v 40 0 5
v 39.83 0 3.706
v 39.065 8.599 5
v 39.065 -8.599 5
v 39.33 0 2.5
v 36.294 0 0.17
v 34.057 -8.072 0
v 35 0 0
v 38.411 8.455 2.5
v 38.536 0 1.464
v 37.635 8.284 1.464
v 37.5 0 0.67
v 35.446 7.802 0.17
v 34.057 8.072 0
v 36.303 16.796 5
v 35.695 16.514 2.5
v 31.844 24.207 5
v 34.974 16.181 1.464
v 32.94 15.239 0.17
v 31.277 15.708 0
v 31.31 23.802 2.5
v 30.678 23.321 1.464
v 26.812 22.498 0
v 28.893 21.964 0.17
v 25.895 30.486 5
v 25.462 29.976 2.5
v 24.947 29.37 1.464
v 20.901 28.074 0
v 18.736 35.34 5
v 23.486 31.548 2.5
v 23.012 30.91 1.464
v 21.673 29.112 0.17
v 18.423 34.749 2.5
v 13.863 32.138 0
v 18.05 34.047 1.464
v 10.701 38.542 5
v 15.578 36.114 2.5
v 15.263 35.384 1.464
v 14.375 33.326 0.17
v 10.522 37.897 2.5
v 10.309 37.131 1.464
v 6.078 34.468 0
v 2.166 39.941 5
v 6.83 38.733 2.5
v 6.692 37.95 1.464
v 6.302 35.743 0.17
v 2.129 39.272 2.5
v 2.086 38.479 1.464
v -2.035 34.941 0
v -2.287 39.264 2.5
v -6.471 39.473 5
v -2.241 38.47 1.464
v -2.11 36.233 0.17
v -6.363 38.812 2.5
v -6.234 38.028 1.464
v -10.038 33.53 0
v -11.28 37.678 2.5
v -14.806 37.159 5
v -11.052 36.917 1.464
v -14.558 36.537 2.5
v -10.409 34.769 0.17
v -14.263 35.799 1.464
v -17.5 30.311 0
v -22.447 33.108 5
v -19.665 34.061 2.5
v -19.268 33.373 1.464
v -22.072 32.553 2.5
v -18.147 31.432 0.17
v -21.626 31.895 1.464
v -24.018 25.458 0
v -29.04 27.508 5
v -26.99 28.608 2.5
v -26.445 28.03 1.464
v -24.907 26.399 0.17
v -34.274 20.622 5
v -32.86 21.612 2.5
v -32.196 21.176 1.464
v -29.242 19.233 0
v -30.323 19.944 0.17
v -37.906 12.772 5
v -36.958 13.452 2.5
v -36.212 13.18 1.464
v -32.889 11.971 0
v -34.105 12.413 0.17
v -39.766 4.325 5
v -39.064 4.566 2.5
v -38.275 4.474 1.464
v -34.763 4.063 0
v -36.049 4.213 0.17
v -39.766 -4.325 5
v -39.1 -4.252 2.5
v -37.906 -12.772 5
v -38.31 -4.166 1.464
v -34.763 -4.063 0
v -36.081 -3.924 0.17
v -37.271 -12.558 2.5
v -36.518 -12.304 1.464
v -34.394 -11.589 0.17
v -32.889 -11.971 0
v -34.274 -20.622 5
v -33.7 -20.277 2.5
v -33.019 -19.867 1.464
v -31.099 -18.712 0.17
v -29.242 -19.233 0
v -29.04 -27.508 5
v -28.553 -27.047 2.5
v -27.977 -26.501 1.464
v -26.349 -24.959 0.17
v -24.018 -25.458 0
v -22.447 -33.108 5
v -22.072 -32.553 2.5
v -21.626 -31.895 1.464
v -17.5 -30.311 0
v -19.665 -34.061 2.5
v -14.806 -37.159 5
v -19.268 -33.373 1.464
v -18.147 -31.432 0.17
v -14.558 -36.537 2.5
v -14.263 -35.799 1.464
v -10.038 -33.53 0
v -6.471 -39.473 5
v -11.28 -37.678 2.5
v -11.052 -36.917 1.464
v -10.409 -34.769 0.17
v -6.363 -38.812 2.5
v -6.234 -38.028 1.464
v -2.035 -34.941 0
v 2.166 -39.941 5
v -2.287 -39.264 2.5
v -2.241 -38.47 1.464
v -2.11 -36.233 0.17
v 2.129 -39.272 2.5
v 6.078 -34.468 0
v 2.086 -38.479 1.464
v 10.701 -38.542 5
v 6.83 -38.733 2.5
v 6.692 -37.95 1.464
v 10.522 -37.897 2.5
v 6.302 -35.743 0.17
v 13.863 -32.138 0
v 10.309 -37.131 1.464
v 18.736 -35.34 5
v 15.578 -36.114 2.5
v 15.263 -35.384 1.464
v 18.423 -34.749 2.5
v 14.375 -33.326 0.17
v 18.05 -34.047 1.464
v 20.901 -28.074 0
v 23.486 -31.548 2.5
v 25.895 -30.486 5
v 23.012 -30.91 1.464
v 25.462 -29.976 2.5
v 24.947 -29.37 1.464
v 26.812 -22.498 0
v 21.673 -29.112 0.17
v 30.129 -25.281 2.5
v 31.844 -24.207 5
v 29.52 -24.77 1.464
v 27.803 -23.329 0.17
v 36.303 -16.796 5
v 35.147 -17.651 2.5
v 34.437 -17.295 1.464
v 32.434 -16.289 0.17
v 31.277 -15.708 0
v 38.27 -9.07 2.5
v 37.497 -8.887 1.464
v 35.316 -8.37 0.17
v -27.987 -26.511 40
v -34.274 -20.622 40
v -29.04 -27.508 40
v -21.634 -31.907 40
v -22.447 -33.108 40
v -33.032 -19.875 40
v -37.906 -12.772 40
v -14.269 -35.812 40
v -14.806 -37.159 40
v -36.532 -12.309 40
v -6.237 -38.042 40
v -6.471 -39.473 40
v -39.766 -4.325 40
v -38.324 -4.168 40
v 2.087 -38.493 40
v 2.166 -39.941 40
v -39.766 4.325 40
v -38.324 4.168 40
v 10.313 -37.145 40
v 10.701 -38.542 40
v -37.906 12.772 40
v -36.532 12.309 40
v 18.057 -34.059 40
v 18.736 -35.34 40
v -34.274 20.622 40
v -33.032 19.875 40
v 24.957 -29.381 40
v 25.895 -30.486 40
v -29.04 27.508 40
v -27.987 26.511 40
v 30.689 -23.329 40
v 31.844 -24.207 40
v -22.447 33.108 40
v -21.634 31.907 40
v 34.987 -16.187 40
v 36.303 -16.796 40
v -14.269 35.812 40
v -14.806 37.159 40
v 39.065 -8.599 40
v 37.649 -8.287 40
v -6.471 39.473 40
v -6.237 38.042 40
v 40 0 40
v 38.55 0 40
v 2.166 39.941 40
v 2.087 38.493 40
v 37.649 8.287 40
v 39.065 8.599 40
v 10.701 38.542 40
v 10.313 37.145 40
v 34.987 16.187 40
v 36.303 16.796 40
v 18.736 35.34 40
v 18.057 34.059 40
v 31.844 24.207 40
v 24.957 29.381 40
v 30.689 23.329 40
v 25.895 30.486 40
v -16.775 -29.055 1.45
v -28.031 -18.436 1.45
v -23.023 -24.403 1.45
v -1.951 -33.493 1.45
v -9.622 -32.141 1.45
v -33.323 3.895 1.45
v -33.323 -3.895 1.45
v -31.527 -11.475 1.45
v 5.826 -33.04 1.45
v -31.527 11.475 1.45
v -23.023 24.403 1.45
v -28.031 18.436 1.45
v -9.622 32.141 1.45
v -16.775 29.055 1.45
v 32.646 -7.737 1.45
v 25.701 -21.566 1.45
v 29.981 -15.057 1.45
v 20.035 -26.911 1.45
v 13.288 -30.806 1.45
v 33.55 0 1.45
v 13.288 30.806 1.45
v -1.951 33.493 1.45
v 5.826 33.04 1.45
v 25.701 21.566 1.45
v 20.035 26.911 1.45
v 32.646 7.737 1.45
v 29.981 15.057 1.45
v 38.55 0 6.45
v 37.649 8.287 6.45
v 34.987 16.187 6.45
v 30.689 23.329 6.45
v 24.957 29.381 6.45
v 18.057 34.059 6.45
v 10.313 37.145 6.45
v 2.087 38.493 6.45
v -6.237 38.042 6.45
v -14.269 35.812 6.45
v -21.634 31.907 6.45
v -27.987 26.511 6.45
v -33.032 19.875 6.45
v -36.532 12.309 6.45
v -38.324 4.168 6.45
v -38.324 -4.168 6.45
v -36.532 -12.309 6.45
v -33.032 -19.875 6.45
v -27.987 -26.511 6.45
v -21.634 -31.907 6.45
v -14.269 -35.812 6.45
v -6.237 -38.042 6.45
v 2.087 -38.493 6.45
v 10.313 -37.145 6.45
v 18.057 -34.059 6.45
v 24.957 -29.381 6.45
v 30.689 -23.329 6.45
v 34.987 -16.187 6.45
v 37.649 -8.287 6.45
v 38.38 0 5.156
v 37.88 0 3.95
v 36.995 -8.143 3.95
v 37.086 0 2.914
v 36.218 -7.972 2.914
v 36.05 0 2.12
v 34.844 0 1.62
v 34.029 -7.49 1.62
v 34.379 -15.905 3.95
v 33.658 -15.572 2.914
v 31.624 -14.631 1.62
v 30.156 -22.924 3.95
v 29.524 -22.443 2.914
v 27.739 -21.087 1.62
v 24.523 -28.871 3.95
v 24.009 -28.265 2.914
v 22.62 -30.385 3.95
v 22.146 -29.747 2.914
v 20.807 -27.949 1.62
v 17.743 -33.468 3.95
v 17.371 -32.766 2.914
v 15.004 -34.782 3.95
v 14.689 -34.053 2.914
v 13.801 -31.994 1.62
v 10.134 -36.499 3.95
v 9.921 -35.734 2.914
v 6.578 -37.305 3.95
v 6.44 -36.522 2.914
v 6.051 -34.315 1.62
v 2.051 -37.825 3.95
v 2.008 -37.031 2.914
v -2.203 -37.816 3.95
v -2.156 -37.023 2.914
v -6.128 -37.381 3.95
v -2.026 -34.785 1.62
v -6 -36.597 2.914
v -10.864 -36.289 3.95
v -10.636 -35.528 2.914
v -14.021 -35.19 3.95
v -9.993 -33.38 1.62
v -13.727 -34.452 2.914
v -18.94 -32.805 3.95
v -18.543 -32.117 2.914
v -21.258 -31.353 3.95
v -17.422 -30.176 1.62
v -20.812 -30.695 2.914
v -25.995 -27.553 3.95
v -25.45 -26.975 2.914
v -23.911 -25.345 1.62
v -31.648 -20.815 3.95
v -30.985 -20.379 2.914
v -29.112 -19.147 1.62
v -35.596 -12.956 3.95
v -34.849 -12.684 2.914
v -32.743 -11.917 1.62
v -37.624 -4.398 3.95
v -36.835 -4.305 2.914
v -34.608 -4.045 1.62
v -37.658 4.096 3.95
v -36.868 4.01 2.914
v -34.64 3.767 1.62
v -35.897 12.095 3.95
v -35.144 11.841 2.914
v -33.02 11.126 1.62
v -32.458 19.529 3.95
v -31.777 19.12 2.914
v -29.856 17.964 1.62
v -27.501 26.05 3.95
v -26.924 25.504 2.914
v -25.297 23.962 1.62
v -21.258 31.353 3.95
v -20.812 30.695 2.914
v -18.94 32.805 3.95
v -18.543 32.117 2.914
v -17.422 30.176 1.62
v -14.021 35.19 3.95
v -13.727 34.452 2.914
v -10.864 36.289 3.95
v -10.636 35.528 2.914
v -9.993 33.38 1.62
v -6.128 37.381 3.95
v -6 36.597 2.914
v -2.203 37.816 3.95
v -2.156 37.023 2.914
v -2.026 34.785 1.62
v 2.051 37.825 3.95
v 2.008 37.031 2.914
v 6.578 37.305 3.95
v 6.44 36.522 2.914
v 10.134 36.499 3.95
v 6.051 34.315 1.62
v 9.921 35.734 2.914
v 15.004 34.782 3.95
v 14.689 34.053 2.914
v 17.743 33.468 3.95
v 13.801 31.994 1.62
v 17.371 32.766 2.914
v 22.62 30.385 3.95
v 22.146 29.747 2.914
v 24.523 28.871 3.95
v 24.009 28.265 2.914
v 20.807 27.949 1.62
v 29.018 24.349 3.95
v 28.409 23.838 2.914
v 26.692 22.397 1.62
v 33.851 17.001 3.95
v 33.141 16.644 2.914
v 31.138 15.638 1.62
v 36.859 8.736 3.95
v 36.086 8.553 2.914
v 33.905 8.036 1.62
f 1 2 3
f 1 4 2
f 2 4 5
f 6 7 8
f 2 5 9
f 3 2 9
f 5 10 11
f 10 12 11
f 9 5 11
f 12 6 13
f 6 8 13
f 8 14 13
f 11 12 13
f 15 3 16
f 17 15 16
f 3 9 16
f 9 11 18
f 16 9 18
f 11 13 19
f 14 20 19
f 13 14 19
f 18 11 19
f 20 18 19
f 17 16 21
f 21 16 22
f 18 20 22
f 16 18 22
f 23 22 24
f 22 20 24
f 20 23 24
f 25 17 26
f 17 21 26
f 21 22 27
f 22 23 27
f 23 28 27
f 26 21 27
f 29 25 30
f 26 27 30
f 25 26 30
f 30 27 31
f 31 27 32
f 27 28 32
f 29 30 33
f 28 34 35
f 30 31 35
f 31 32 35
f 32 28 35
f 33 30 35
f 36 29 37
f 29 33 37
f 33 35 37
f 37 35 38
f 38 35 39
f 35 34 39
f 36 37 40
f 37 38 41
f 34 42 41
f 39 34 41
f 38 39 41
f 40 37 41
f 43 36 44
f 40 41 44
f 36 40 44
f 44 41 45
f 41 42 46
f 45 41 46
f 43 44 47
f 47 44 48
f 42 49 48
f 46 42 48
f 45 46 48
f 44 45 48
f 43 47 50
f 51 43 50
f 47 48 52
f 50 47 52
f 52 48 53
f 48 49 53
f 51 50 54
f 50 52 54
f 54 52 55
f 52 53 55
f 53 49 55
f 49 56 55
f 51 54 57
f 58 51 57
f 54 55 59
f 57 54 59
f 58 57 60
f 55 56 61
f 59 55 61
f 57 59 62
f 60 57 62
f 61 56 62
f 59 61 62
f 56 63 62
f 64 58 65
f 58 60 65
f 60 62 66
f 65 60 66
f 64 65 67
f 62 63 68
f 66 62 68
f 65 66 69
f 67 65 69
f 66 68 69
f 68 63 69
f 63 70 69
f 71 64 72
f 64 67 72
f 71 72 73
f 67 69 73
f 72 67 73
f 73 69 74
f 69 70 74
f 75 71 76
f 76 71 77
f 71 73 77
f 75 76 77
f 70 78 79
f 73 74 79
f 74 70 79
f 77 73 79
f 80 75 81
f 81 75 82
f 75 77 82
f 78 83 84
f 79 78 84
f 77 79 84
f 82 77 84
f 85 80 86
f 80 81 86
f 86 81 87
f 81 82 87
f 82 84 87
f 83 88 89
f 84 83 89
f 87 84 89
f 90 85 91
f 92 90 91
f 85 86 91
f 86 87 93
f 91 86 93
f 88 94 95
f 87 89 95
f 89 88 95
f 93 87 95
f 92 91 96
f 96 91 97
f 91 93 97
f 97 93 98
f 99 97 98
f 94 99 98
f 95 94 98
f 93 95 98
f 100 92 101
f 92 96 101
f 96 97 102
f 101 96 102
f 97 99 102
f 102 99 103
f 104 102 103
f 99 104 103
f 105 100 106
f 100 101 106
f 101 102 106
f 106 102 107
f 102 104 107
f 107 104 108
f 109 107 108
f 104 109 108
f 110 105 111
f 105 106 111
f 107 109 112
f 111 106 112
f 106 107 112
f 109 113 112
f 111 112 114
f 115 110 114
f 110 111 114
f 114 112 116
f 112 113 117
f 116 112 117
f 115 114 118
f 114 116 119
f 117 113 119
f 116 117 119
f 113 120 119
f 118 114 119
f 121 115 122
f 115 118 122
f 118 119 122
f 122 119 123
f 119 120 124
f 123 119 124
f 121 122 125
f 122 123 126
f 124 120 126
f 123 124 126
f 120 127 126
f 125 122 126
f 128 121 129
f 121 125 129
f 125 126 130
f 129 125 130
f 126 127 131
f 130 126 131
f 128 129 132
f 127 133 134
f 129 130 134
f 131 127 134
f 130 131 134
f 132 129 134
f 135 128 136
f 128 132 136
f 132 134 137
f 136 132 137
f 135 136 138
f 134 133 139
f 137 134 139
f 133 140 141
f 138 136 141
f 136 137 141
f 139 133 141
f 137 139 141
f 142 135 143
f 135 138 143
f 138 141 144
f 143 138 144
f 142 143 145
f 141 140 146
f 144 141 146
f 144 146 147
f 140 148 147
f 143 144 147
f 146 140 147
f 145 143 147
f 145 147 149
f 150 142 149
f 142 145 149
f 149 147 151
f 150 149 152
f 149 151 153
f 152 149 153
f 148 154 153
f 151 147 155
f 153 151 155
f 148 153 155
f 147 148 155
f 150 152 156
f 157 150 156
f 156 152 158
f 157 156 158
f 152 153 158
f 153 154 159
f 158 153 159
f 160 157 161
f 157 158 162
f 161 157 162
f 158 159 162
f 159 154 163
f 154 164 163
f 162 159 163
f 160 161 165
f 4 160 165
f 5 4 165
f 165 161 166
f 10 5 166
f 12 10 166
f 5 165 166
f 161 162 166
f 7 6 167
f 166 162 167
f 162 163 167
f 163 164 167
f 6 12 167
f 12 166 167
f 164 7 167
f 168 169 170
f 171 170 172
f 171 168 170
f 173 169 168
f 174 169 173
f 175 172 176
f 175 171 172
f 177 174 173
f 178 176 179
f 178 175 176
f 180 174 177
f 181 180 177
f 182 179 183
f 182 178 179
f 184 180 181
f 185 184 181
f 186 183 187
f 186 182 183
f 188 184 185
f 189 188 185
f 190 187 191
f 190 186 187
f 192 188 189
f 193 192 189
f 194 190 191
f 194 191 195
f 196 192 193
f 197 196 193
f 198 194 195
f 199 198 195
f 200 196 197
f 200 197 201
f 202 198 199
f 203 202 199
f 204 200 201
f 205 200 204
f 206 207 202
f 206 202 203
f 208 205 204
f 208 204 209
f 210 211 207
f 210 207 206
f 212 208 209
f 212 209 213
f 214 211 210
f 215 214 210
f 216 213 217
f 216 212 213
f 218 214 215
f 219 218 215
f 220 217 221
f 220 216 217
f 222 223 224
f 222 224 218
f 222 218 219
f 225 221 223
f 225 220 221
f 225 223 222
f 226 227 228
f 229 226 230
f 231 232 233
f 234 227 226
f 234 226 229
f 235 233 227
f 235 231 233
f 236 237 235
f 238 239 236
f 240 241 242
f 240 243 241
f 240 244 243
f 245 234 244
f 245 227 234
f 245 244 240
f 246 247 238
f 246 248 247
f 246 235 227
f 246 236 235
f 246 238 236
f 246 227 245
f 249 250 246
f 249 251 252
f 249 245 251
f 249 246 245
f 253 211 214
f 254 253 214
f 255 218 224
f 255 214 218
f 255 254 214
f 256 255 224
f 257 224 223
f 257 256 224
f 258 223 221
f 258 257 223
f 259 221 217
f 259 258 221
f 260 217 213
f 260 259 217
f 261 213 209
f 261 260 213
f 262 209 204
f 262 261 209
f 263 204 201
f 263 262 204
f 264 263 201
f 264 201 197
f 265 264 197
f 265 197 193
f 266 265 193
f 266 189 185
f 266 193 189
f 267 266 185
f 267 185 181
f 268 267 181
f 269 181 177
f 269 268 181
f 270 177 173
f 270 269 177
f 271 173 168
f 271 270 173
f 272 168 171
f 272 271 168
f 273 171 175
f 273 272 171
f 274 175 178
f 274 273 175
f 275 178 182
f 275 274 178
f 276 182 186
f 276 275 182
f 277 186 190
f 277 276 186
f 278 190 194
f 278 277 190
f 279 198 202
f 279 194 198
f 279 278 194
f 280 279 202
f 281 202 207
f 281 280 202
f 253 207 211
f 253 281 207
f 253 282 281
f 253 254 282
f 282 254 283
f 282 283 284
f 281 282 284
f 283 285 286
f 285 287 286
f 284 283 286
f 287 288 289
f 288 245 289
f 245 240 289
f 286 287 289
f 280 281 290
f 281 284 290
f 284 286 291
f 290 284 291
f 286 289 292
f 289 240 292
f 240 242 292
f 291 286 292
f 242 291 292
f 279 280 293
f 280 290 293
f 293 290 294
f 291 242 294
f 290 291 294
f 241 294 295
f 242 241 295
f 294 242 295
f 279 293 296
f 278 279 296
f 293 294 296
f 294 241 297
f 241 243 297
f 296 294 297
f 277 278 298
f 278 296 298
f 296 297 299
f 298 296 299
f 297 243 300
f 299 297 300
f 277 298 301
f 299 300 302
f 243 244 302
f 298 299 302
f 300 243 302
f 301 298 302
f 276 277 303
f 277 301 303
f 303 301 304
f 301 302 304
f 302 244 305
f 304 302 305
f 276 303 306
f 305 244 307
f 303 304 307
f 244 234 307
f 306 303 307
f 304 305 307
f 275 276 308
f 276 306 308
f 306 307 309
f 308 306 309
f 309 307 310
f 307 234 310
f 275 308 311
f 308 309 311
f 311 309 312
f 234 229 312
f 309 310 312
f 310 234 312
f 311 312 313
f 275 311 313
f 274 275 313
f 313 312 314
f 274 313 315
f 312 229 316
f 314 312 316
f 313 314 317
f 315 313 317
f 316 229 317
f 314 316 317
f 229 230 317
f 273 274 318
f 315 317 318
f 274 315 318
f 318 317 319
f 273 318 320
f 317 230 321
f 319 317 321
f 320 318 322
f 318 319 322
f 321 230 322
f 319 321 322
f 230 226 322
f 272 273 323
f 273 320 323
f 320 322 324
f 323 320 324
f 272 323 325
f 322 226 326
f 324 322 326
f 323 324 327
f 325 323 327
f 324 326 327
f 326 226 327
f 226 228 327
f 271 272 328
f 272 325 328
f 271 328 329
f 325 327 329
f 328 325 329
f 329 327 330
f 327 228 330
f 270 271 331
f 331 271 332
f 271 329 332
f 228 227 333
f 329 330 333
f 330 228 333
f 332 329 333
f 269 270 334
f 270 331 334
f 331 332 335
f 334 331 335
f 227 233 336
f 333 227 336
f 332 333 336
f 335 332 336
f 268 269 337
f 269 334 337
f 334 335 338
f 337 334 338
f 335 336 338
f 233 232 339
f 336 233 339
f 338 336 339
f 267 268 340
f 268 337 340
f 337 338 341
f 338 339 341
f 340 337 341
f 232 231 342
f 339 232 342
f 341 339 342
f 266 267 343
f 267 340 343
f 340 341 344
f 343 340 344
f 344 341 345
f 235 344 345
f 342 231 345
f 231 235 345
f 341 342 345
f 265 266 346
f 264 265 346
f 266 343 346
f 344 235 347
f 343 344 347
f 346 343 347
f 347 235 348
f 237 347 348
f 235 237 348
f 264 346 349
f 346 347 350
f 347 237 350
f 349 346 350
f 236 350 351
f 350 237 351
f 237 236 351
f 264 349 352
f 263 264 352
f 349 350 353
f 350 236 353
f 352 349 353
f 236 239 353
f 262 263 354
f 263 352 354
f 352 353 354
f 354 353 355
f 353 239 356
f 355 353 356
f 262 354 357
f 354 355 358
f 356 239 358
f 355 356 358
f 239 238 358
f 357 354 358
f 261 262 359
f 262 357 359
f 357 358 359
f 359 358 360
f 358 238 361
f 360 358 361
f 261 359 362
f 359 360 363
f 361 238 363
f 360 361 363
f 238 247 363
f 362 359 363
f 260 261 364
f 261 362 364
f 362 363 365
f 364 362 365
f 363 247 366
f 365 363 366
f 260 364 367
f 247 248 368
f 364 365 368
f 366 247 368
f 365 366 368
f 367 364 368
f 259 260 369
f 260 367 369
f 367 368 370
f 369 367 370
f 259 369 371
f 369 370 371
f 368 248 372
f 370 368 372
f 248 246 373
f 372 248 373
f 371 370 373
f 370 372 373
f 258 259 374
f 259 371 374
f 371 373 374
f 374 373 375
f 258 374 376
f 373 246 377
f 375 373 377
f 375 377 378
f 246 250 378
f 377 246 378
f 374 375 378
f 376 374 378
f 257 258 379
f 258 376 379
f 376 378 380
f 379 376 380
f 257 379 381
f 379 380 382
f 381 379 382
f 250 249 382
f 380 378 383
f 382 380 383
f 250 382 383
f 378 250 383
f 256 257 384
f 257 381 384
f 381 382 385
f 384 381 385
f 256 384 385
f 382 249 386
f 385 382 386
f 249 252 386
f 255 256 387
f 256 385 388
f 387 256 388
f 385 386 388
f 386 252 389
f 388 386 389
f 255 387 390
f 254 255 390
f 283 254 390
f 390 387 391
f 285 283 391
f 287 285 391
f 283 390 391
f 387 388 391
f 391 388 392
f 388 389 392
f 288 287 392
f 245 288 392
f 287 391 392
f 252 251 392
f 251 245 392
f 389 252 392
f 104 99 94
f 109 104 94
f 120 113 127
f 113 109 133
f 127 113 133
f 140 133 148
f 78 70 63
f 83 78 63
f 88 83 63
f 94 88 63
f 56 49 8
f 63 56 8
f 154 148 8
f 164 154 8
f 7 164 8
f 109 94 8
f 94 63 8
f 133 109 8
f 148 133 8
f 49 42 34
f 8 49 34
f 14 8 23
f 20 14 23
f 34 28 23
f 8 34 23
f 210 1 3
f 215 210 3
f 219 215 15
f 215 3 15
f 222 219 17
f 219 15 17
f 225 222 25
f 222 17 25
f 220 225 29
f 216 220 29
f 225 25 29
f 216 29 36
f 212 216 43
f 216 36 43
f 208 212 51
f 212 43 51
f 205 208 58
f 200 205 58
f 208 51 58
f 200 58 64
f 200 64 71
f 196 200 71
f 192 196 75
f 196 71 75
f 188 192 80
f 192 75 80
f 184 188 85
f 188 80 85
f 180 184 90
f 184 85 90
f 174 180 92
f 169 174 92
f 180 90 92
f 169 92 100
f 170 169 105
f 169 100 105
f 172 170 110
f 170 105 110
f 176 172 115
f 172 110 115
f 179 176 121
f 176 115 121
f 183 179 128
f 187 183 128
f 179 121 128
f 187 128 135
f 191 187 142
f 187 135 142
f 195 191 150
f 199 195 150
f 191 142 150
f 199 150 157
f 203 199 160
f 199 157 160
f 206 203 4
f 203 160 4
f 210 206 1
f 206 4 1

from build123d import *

# Parameters (mm, degrees)
SKETCH1_R           = 40
BOSS_EXTRUDE1_DEPTH = 40
SHELL1_T            = -1.45
FILLET1_R           = 5


with BuildPart() as part:
    # Sketch1 → Boss-Extrude1 (new body)
    with BuildSketch(Plane.XY):
        Circle(SKETCH1_R)
    extrude(amount=BOSS_EXTRUDE1_DEPTH)

    # Shell1
    shell1_openings = [part.faces().sort_by_distance(p)[0] for p in [
        (0, 0, 40),
    ]]
    offset(amount=SHELL1_T, openings=shell1_openings, kind=Kind.INTERSECTION)

    # Fillet1
    fillet1_edges = [part.edges().sort_by_distance(p)[0] for p in [
        (-40, 0, 0),
        (-38.55, 0, 1.45),
    ]]
    fillet(fillet1_edges, radius=FILLET1_R)


solid = part.part
